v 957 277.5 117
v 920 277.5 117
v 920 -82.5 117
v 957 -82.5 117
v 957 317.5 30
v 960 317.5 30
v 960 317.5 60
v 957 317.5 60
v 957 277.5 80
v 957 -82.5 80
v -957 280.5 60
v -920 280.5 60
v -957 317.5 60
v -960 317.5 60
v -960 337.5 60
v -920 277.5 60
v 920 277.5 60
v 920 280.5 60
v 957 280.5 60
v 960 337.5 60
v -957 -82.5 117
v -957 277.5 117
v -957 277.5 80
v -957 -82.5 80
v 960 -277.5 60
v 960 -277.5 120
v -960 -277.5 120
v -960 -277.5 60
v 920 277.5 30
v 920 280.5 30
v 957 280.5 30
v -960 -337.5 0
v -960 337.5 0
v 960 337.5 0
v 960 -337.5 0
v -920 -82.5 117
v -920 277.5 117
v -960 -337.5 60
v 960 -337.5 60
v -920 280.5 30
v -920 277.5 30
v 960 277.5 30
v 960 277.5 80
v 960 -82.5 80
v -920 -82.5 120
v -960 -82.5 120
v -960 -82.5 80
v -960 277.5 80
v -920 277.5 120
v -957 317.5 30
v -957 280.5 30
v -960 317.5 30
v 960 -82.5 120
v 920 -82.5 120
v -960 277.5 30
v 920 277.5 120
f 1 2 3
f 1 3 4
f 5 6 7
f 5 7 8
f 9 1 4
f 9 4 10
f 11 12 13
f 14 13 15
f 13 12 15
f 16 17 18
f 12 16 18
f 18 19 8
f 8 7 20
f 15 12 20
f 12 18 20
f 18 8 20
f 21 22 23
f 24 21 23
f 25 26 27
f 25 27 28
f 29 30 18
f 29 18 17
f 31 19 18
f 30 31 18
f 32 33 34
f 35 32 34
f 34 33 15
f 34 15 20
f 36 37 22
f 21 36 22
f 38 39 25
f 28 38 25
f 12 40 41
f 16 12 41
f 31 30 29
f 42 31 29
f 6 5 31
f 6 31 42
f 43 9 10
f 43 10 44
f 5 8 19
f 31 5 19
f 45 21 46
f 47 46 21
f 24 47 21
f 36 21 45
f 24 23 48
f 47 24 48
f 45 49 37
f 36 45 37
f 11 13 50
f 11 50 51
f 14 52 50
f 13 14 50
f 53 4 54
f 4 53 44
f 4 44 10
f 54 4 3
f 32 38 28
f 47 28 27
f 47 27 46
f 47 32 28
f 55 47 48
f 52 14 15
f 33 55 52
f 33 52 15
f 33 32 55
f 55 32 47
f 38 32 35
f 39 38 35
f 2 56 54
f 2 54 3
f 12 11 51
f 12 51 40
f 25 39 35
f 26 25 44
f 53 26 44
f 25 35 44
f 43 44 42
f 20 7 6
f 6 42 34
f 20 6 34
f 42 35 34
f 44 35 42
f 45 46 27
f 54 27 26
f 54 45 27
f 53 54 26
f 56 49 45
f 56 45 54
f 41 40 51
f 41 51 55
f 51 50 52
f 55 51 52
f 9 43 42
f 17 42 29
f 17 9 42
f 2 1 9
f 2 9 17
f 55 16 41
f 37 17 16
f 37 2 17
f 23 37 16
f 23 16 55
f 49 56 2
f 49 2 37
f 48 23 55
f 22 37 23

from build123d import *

# Parameters (mm, degrees)
SKETCH1_W           = 1920
SKETCH1_H           = 675
BOSS_EXTRUDE1_DEPTH = 120
SKETCH2_W           = 60
SKETCH2_H           = 60
CUT_EXTRUDE1_DEPTH  = 1954.127299999
CUT_EXTRUDE2_DEPTH  = 360
CUT_EXTRUDE3_DEPTH  = 30


with BuildPart() as part:
    # Sketch1 → Boss-Extrude1 (new body)
    with BuildSketch(Plane.XY):
        Rectangle(SKETCH1_W, SKETCH1_H)
    extrude(amount=BOSS_EXTRUDE1_DEPTH)

    # Sketch2 → Cut-Extrude1 (cut, through all)
    with BuildSketch(Plane(origin=(960, 0, 0), x_dir=(0, 0, -1), z_dir=(1, 0, 0))):
        with Locations((-90, 307.5)):
            Rectangle(SKETCH2_W, SKETCH2_H)
        with Locations((-90, -307.5)):
            Rectangle(SKETCH2_W, SKETCH2_H)
    extrude(amount=-CUT_EXTRUDE1_DEPTH, mode=Mode.SUBTRACT)

    # Sketch3 → Cut-Extrude2 (cut)
    with BuildSketch(Plane(origin=(0, 277.5, 0), x_dir=(1, 0, 0), z_dir=(0, 1, 0))):
        Polygon((-960, -120), (-920, -120), (-920, -117), (-957, -117), (-957, -80), (-960, -80), align=None)
    cut_extrude2 = extrude(amount=-CUT_EXTRUDE2_DEPTH, mode=Mode.SUBTRACT)

    # Sketch4 → Cut-Extrude3 (cut)
    with BuildSketch(Plane.XY.offset(60)):
        Polygon((-957, 280.5), (-920, 280.5), (-920, 277.5), (-960, 277.5), (-960, 317.5), (-957, 317.5), align=None)
    cut_extrude3 = extrude(amount=-CUT_EXTRUDE3_DEPTH, mode=Mode.SUBTRACT)

    # Mirror1: Cut-Extrude2, Cut-Extrude3 across plane
    add(cut_extrude2.mirror(Plane(origin=(0, 0, 0), x_dir=(0, 0, 1), z_dir=(1, 0, 0))), mode=Mode.SUBTRACT)
    add(cut_extrude3.mirror(Plane(origin=(0, 0, 0), x_dir=(0, 0, 1), z_dir=(1, 0, 0))), mode=Mode.SUBTRACT)


solid = part.part
